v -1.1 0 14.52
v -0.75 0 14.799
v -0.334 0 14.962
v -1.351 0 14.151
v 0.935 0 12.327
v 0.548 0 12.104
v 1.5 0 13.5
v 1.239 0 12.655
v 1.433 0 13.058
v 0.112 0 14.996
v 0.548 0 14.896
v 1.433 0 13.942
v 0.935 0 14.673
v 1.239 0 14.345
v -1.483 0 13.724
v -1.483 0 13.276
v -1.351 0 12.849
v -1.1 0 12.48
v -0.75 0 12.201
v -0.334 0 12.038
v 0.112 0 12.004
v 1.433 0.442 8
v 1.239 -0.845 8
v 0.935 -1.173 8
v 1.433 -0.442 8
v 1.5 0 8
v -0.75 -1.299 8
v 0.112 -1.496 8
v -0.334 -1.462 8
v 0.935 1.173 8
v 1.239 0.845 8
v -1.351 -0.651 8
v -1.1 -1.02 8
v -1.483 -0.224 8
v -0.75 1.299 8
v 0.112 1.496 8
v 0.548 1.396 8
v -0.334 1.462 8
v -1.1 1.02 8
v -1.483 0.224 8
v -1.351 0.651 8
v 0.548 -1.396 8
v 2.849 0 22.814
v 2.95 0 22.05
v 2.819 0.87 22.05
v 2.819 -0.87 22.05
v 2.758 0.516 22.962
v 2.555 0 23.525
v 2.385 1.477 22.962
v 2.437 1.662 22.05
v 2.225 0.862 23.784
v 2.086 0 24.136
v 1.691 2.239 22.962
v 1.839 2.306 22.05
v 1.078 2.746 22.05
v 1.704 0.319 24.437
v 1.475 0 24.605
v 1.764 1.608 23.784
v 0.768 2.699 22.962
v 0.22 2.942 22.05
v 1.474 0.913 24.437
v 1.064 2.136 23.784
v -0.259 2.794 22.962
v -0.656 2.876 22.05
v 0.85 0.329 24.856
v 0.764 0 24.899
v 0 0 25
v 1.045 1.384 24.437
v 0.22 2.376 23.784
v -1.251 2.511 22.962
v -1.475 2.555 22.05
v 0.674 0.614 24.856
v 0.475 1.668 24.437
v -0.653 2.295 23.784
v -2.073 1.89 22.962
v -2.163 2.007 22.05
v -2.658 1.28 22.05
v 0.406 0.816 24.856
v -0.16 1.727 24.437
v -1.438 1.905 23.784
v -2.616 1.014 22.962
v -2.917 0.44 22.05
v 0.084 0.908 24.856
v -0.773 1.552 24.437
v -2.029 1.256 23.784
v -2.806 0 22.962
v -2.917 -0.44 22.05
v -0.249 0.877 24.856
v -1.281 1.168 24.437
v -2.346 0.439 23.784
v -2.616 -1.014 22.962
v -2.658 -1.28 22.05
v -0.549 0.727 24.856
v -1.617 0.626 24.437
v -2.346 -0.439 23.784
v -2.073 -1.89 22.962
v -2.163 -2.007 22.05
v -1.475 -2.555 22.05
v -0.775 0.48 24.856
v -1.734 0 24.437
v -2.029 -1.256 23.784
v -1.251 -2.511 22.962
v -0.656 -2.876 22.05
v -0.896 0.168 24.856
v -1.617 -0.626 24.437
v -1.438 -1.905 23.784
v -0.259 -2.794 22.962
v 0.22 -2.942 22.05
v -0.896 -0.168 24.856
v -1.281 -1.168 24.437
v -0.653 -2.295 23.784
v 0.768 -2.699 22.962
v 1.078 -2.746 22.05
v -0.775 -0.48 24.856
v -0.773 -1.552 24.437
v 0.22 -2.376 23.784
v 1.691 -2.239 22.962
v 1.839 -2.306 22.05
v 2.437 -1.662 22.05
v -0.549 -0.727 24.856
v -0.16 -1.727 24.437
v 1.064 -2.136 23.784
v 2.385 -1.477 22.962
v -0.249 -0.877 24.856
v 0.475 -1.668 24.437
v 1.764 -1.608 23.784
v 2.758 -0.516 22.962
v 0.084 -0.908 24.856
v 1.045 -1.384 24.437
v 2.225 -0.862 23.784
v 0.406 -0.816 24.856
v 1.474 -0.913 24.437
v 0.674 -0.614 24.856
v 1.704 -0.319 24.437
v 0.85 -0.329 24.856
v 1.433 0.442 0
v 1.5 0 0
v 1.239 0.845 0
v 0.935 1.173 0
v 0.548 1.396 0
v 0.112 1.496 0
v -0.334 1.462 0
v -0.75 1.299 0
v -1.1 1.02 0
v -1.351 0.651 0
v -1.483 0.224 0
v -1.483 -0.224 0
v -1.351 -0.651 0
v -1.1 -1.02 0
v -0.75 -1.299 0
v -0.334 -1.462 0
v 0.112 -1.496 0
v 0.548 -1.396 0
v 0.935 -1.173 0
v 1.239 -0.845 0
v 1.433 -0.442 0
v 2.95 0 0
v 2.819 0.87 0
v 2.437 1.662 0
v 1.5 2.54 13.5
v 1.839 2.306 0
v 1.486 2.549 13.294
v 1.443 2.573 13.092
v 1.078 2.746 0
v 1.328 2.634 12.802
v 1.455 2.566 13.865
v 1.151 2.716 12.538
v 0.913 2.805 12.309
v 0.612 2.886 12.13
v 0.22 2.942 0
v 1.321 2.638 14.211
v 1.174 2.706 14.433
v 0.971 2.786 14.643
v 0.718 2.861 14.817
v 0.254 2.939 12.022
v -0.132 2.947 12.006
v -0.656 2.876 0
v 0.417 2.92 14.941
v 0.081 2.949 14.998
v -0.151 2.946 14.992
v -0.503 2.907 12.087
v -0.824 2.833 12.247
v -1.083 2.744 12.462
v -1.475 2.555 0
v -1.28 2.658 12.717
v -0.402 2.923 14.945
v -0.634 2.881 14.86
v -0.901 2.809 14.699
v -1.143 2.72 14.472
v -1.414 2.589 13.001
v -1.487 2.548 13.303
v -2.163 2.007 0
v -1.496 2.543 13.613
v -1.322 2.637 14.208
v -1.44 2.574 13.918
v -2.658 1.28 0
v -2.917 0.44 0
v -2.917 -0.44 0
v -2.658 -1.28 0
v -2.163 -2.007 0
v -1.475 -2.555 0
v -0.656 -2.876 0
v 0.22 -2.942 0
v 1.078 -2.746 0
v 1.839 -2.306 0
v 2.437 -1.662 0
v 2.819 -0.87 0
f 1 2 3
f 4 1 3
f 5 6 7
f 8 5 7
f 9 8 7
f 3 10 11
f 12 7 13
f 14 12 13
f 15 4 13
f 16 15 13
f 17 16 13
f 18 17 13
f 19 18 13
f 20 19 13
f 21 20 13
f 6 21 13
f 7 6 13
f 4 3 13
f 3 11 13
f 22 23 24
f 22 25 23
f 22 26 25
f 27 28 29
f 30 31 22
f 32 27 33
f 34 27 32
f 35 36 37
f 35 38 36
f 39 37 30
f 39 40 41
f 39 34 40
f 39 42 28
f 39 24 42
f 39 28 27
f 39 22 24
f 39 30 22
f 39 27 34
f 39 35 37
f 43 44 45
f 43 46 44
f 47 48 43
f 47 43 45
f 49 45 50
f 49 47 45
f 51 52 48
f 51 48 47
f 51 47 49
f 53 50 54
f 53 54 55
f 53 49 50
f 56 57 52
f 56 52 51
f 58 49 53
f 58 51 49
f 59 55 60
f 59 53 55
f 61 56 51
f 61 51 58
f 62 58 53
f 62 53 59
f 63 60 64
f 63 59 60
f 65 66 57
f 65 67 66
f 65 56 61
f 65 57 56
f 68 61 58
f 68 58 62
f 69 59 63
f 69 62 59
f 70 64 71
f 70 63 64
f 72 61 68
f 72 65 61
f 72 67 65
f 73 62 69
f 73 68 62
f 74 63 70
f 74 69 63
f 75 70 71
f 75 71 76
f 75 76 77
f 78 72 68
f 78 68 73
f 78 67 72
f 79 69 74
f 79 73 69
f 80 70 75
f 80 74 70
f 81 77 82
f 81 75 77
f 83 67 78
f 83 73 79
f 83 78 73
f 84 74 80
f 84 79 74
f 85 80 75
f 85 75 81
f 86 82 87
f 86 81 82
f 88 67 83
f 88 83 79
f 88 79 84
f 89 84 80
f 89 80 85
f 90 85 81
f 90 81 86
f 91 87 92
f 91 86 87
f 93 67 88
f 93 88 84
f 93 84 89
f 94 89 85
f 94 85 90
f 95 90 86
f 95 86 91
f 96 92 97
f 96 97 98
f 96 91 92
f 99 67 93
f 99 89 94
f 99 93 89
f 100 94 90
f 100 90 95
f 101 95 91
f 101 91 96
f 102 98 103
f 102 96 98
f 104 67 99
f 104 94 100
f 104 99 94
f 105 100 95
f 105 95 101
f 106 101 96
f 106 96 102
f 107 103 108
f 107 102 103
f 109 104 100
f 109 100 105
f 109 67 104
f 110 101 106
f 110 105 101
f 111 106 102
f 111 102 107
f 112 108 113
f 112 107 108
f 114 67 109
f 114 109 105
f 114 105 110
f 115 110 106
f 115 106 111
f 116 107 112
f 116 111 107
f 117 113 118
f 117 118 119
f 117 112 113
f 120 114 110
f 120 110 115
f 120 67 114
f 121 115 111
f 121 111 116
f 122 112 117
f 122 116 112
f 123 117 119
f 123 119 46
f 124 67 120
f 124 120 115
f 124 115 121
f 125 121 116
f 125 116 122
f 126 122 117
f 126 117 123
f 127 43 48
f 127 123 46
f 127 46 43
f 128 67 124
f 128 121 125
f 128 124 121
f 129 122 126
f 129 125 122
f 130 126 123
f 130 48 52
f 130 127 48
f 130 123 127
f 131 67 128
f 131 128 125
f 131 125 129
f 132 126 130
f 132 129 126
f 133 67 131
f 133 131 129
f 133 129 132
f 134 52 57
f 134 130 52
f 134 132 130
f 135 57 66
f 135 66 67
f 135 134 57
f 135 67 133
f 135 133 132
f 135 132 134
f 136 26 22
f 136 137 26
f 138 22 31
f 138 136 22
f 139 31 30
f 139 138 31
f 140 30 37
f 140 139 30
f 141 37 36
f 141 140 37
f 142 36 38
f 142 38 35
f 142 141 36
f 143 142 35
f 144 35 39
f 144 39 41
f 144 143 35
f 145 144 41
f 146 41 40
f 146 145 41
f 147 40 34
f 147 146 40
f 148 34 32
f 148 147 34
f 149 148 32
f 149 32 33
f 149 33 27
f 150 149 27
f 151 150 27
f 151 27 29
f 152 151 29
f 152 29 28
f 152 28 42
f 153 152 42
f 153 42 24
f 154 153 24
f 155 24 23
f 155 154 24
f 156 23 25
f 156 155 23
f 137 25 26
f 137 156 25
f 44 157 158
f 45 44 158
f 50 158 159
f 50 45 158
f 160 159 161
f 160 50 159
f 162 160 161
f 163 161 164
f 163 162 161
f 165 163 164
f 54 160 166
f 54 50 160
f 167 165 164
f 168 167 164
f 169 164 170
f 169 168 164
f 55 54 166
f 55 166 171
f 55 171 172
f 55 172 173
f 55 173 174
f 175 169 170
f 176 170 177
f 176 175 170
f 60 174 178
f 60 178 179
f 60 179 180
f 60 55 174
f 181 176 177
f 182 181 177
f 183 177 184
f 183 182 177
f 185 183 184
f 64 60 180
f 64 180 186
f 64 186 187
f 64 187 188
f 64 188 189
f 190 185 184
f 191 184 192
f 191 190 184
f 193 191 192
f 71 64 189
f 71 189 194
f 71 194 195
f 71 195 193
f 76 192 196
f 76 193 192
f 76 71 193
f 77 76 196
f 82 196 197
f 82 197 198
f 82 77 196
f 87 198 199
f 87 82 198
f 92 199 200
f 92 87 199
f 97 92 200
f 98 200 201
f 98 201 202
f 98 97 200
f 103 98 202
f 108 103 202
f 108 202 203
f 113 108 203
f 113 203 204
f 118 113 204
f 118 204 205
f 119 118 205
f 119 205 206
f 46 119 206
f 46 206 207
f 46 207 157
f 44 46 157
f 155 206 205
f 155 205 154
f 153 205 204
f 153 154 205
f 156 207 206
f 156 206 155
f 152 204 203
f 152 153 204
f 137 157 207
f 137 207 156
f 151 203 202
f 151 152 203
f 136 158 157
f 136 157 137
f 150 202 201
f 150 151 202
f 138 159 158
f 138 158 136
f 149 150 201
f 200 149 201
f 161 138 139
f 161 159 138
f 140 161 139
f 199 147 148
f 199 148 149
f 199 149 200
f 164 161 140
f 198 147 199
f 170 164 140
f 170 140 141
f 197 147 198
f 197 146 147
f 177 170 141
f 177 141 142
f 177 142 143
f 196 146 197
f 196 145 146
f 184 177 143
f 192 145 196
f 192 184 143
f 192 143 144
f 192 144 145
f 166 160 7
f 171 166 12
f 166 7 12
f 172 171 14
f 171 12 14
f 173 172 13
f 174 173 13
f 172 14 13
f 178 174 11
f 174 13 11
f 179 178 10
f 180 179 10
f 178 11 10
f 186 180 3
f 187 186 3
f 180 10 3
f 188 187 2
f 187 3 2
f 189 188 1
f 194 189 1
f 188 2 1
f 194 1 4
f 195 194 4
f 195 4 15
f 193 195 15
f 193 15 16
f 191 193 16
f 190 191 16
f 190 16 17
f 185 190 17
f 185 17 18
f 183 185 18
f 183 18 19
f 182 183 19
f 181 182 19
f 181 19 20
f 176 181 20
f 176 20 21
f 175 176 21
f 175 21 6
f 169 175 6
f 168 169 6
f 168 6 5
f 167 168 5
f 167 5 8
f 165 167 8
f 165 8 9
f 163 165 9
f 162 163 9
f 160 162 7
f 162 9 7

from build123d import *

# Parameters (mm, degrees)
F2_R     = 1.5
F3_DEPTH = 25


with BuildPart() as f1:
    # F0 (on Front) → F1 (revolve)
    with BuildSketch(Plane.XZ):
        with BuildLine():
            Line((1.5, 8), (1.5, 0))
            Line((1.5, 0), (2.95, 0))
            Line((2.95, 0), (2.95, 22.05))
            ThreePointArc((2.95, 22.05), (2.085965, 24.135965), (0, 25))
            Line((0, 25), (0, 8))
            Line((0, 8), (1.5, 8))
        make_face()
    revolve(axis=Axis((0, 0, 16.5), (0, 0, 1)))

    # F2 (on Front) → F3 (cut)
    with BuildSketch(Plane.XZ):
        with Locations((0, 13.5)):
            Circle(F2_R)
    extrude(amount=-F3_DEPTH, mode=Mode.SUBTRACT)


solid = f1.part
